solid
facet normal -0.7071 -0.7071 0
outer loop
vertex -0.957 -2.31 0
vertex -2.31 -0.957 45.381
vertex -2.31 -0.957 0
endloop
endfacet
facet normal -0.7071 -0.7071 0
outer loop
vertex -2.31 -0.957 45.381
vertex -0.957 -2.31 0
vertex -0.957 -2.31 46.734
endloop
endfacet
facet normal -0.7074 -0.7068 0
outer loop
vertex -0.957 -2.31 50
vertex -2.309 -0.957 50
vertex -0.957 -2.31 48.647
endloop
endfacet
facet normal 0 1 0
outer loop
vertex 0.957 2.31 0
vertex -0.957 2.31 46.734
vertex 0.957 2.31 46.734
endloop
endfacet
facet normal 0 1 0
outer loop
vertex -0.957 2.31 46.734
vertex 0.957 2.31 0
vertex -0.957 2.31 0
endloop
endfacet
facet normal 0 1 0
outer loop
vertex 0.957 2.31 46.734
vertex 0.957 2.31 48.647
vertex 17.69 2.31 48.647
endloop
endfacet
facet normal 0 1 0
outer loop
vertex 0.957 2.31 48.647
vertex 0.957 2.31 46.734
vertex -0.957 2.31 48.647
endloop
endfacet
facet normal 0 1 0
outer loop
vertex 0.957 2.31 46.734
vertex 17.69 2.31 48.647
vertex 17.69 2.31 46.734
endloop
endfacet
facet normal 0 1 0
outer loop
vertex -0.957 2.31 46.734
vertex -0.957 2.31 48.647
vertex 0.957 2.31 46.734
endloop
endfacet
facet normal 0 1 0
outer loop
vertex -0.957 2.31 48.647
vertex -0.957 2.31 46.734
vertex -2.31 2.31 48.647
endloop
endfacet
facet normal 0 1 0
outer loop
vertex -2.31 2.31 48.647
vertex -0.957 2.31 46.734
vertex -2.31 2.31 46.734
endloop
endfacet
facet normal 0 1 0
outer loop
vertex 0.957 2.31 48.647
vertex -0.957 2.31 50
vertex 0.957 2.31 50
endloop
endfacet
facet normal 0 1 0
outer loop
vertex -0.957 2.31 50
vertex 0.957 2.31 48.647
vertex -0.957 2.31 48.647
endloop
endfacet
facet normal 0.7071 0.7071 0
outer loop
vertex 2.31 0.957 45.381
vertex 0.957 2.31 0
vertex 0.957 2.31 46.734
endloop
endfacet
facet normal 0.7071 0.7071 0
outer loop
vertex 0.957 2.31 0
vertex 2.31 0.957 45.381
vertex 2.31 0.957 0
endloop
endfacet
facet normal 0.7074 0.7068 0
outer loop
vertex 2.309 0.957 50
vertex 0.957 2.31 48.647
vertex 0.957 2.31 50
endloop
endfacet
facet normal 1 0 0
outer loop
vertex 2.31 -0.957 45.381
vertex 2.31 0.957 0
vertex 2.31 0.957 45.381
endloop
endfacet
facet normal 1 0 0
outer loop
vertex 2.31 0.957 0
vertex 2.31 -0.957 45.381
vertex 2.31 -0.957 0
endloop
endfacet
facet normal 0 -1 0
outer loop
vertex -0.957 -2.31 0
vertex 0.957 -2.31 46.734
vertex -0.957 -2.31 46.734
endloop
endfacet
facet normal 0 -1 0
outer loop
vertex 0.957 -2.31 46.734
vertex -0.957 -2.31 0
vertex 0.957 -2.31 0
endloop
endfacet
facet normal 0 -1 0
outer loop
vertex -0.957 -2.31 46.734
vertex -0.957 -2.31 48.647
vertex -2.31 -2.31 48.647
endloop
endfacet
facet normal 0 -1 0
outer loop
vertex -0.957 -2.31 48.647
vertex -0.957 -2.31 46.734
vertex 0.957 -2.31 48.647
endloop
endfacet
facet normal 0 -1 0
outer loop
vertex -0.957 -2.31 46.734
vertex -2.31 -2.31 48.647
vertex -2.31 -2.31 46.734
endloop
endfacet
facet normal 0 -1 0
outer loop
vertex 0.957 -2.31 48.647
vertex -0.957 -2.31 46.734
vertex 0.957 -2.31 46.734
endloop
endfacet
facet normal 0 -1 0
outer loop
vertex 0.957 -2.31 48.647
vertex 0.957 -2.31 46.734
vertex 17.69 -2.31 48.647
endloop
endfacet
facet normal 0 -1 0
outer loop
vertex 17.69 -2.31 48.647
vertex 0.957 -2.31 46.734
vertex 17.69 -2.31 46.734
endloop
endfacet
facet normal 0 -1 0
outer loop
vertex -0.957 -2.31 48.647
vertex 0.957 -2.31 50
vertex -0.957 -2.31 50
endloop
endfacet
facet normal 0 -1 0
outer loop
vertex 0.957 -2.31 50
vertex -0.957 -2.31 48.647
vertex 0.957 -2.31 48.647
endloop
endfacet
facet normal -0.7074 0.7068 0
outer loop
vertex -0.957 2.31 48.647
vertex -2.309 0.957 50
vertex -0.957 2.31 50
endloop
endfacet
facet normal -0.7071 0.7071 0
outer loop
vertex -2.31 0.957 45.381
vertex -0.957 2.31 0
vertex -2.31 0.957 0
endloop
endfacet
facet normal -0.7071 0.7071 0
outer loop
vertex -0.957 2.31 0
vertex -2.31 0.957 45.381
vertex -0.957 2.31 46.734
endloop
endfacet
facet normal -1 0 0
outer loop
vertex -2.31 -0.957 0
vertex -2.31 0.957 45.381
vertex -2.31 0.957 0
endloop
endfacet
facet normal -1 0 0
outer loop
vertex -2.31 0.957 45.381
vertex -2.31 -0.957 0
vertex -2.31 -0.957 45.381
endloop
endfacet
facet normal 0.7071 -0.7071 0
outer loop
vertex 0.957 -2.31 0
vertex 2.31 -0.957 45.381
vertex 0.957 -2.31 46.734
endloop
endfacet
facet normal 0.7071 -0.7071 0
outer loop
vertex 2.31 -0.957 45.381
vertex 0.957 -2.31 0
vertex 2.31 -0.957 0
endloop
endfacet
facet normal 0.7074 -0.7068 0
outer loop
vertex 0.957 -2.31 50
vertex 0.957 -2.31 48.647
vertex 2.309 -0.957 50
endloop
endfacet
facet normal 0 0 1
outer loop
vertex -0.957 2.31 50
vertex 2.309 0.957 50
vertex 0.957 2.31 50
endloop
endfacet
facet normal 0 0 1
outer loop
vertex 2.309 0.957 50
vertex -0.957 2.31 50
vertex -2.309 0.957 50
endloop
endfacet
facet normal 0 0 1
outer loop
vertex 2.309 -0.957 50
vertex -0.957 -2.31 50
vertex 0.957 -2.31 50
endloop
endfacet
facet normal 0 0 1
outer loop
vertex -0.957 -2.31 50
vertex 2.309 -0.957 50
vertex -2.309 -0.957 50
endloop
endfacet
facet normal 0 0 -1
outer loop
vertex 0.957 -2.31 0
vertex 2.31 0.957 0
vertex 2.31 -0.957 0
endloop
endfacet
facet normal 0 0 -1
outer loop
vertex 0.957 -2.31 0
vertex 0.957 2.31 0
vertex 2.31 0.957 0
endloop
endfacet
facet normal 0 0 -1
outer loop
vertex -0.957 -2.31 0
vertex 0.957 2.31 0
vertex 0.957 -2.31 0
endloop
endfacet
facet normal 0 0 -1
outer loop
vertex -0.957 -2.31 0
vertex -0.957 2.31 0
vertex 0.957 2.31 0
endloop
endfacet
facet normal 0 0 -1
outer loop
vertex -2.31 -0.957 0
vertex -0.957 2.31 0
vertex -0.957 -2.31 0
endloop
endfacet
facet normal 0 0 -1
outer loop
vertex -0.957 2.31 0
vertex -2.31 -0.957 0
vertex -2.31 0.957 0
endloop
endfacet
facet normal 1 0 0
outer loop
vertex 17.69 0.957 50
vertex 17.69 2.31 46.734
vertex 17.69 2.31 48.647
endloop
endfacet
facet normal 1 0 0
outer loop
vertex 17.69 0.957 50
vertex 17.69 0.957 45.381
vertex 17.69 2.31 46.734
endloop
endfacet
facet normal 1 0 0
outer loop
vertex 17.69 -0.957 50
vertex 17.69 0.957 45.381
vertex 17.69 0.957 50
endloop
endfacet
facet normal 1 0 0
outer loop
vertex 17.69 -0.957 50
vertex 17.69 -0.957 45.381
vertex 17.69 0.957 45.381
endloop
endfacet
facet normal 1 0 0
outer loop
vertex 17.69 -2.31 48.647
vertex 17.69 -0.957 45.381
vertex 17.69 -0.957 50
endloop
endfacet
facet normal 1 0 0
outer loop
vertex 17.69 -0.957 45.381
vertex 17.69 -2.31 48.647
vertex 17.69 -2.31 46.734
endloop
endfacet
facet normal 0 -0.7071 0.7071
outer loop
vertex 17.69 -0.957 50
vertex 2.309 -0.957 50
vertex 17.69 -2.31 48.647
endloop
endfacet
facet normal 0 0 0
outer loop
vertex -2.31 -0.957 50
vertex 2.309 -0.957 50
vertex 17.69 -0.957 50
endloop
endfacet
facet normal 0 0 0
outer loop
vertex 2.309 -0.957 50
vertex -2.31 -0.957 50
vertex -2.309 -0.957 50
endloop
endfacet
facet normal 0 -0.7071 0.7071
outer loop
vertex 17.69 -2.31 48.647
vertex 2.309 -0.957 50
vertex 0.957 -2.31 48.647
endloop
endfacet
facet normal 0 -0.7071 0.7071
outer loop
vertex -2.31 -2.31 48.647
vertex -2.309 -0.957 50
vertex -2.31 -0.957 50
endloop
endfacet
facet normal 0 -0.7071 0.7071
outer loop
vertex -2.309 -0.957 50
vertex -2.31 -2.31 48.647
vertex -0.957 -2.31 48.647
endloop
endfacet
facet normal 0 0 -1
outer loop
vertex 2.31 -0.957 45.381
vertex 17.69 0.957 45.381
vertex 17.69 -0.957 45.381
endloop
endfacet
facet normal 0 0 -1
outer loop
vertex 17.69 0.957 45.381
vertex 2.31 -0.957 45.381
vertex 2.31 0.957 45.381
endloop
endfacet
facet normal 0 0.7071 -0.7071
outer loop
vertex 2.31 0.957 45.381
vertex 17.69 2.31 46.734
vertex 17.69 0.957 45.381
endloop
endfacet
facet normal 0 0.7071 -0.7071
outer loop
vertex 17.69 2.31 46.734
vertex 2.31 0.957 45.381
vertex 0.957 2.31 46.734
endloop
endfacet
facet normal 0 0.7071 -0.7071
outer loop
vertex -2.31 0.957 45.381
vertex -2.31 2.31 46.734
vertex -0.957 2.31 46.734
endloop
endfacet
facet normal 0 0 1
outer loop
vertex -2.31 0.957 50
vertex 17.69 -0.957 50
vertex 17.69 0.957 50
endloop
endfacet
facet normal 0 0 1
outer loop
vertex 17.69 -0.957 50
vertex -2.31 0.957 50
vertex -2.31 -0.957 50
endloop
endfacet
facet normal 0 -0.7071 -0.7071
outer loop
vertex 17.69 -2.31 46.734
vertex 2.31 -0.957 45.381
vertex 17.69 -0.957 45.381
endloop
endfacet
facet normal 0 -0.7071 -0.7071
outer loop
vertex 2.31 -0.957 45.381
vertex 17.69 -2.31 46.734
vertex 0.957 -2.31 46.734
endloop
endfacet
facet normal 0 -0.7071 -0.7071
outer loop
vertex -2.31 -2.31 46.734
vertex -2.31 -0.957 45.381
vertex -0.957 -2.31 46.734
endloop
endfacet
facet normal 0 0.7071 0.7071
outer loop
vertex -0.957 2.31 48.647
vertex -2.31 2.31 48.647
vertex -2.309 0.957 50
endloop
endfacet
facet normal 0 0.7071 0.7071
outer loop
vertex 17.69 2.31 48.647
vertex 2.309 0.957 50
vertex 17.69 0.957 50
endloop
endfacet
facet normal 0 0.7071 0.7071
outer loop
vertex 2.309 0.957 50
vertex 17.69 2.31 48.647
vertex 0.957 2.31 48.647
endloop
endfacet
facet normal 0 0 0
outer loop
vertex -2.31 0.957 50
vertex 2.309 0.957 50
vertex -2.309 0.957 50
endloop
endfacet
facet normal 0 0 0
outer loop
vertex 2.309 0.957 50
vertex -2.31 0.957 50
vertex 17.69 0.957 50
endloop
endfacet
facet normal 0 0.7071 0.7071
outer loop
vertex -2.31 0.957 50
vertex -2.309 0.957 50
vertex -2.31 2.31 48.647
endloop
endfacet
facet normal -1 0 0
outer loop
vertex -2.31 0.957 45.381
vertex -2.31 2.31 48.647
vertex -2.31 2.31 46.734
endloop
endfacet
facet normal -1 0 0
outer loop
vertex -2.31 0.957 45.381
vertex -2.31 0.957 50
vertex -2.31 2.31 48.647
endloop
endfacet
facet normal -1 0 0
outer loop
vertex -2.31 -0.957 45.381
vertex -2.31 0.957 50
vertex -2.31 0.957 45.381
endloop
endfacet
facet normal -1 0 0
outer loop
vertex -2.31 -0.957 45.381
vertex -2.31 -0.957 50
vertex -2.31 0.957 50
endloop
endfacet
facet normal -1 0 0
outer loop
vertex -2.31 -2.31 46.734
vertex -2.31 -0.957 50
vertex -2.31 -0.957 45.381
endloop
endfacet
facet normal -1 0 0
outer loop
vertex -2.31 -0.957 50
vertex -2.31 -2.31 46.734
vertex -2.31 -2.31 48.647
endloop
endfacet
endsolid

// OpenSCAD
// Key diameter
diameter=5;

//Height
height=50;

//Lenth
lenth=20;

//Number of faces
$fn=8;

/* [Hidden] */

z=(-height)+diameter/2.165;

x=diameter/-2.1645021645;

rotation=(360/$fn)/2;

radius=diameter/2;

rotate([0,0,rotation]){
cylinder(r=radius, h=height);
    }


rotate([0,90,0]){
    translate([z,0,x]){
        rotate([0,0,rotation]){
            cylinder(r=radius, h=lenth);
        }
    }
}
